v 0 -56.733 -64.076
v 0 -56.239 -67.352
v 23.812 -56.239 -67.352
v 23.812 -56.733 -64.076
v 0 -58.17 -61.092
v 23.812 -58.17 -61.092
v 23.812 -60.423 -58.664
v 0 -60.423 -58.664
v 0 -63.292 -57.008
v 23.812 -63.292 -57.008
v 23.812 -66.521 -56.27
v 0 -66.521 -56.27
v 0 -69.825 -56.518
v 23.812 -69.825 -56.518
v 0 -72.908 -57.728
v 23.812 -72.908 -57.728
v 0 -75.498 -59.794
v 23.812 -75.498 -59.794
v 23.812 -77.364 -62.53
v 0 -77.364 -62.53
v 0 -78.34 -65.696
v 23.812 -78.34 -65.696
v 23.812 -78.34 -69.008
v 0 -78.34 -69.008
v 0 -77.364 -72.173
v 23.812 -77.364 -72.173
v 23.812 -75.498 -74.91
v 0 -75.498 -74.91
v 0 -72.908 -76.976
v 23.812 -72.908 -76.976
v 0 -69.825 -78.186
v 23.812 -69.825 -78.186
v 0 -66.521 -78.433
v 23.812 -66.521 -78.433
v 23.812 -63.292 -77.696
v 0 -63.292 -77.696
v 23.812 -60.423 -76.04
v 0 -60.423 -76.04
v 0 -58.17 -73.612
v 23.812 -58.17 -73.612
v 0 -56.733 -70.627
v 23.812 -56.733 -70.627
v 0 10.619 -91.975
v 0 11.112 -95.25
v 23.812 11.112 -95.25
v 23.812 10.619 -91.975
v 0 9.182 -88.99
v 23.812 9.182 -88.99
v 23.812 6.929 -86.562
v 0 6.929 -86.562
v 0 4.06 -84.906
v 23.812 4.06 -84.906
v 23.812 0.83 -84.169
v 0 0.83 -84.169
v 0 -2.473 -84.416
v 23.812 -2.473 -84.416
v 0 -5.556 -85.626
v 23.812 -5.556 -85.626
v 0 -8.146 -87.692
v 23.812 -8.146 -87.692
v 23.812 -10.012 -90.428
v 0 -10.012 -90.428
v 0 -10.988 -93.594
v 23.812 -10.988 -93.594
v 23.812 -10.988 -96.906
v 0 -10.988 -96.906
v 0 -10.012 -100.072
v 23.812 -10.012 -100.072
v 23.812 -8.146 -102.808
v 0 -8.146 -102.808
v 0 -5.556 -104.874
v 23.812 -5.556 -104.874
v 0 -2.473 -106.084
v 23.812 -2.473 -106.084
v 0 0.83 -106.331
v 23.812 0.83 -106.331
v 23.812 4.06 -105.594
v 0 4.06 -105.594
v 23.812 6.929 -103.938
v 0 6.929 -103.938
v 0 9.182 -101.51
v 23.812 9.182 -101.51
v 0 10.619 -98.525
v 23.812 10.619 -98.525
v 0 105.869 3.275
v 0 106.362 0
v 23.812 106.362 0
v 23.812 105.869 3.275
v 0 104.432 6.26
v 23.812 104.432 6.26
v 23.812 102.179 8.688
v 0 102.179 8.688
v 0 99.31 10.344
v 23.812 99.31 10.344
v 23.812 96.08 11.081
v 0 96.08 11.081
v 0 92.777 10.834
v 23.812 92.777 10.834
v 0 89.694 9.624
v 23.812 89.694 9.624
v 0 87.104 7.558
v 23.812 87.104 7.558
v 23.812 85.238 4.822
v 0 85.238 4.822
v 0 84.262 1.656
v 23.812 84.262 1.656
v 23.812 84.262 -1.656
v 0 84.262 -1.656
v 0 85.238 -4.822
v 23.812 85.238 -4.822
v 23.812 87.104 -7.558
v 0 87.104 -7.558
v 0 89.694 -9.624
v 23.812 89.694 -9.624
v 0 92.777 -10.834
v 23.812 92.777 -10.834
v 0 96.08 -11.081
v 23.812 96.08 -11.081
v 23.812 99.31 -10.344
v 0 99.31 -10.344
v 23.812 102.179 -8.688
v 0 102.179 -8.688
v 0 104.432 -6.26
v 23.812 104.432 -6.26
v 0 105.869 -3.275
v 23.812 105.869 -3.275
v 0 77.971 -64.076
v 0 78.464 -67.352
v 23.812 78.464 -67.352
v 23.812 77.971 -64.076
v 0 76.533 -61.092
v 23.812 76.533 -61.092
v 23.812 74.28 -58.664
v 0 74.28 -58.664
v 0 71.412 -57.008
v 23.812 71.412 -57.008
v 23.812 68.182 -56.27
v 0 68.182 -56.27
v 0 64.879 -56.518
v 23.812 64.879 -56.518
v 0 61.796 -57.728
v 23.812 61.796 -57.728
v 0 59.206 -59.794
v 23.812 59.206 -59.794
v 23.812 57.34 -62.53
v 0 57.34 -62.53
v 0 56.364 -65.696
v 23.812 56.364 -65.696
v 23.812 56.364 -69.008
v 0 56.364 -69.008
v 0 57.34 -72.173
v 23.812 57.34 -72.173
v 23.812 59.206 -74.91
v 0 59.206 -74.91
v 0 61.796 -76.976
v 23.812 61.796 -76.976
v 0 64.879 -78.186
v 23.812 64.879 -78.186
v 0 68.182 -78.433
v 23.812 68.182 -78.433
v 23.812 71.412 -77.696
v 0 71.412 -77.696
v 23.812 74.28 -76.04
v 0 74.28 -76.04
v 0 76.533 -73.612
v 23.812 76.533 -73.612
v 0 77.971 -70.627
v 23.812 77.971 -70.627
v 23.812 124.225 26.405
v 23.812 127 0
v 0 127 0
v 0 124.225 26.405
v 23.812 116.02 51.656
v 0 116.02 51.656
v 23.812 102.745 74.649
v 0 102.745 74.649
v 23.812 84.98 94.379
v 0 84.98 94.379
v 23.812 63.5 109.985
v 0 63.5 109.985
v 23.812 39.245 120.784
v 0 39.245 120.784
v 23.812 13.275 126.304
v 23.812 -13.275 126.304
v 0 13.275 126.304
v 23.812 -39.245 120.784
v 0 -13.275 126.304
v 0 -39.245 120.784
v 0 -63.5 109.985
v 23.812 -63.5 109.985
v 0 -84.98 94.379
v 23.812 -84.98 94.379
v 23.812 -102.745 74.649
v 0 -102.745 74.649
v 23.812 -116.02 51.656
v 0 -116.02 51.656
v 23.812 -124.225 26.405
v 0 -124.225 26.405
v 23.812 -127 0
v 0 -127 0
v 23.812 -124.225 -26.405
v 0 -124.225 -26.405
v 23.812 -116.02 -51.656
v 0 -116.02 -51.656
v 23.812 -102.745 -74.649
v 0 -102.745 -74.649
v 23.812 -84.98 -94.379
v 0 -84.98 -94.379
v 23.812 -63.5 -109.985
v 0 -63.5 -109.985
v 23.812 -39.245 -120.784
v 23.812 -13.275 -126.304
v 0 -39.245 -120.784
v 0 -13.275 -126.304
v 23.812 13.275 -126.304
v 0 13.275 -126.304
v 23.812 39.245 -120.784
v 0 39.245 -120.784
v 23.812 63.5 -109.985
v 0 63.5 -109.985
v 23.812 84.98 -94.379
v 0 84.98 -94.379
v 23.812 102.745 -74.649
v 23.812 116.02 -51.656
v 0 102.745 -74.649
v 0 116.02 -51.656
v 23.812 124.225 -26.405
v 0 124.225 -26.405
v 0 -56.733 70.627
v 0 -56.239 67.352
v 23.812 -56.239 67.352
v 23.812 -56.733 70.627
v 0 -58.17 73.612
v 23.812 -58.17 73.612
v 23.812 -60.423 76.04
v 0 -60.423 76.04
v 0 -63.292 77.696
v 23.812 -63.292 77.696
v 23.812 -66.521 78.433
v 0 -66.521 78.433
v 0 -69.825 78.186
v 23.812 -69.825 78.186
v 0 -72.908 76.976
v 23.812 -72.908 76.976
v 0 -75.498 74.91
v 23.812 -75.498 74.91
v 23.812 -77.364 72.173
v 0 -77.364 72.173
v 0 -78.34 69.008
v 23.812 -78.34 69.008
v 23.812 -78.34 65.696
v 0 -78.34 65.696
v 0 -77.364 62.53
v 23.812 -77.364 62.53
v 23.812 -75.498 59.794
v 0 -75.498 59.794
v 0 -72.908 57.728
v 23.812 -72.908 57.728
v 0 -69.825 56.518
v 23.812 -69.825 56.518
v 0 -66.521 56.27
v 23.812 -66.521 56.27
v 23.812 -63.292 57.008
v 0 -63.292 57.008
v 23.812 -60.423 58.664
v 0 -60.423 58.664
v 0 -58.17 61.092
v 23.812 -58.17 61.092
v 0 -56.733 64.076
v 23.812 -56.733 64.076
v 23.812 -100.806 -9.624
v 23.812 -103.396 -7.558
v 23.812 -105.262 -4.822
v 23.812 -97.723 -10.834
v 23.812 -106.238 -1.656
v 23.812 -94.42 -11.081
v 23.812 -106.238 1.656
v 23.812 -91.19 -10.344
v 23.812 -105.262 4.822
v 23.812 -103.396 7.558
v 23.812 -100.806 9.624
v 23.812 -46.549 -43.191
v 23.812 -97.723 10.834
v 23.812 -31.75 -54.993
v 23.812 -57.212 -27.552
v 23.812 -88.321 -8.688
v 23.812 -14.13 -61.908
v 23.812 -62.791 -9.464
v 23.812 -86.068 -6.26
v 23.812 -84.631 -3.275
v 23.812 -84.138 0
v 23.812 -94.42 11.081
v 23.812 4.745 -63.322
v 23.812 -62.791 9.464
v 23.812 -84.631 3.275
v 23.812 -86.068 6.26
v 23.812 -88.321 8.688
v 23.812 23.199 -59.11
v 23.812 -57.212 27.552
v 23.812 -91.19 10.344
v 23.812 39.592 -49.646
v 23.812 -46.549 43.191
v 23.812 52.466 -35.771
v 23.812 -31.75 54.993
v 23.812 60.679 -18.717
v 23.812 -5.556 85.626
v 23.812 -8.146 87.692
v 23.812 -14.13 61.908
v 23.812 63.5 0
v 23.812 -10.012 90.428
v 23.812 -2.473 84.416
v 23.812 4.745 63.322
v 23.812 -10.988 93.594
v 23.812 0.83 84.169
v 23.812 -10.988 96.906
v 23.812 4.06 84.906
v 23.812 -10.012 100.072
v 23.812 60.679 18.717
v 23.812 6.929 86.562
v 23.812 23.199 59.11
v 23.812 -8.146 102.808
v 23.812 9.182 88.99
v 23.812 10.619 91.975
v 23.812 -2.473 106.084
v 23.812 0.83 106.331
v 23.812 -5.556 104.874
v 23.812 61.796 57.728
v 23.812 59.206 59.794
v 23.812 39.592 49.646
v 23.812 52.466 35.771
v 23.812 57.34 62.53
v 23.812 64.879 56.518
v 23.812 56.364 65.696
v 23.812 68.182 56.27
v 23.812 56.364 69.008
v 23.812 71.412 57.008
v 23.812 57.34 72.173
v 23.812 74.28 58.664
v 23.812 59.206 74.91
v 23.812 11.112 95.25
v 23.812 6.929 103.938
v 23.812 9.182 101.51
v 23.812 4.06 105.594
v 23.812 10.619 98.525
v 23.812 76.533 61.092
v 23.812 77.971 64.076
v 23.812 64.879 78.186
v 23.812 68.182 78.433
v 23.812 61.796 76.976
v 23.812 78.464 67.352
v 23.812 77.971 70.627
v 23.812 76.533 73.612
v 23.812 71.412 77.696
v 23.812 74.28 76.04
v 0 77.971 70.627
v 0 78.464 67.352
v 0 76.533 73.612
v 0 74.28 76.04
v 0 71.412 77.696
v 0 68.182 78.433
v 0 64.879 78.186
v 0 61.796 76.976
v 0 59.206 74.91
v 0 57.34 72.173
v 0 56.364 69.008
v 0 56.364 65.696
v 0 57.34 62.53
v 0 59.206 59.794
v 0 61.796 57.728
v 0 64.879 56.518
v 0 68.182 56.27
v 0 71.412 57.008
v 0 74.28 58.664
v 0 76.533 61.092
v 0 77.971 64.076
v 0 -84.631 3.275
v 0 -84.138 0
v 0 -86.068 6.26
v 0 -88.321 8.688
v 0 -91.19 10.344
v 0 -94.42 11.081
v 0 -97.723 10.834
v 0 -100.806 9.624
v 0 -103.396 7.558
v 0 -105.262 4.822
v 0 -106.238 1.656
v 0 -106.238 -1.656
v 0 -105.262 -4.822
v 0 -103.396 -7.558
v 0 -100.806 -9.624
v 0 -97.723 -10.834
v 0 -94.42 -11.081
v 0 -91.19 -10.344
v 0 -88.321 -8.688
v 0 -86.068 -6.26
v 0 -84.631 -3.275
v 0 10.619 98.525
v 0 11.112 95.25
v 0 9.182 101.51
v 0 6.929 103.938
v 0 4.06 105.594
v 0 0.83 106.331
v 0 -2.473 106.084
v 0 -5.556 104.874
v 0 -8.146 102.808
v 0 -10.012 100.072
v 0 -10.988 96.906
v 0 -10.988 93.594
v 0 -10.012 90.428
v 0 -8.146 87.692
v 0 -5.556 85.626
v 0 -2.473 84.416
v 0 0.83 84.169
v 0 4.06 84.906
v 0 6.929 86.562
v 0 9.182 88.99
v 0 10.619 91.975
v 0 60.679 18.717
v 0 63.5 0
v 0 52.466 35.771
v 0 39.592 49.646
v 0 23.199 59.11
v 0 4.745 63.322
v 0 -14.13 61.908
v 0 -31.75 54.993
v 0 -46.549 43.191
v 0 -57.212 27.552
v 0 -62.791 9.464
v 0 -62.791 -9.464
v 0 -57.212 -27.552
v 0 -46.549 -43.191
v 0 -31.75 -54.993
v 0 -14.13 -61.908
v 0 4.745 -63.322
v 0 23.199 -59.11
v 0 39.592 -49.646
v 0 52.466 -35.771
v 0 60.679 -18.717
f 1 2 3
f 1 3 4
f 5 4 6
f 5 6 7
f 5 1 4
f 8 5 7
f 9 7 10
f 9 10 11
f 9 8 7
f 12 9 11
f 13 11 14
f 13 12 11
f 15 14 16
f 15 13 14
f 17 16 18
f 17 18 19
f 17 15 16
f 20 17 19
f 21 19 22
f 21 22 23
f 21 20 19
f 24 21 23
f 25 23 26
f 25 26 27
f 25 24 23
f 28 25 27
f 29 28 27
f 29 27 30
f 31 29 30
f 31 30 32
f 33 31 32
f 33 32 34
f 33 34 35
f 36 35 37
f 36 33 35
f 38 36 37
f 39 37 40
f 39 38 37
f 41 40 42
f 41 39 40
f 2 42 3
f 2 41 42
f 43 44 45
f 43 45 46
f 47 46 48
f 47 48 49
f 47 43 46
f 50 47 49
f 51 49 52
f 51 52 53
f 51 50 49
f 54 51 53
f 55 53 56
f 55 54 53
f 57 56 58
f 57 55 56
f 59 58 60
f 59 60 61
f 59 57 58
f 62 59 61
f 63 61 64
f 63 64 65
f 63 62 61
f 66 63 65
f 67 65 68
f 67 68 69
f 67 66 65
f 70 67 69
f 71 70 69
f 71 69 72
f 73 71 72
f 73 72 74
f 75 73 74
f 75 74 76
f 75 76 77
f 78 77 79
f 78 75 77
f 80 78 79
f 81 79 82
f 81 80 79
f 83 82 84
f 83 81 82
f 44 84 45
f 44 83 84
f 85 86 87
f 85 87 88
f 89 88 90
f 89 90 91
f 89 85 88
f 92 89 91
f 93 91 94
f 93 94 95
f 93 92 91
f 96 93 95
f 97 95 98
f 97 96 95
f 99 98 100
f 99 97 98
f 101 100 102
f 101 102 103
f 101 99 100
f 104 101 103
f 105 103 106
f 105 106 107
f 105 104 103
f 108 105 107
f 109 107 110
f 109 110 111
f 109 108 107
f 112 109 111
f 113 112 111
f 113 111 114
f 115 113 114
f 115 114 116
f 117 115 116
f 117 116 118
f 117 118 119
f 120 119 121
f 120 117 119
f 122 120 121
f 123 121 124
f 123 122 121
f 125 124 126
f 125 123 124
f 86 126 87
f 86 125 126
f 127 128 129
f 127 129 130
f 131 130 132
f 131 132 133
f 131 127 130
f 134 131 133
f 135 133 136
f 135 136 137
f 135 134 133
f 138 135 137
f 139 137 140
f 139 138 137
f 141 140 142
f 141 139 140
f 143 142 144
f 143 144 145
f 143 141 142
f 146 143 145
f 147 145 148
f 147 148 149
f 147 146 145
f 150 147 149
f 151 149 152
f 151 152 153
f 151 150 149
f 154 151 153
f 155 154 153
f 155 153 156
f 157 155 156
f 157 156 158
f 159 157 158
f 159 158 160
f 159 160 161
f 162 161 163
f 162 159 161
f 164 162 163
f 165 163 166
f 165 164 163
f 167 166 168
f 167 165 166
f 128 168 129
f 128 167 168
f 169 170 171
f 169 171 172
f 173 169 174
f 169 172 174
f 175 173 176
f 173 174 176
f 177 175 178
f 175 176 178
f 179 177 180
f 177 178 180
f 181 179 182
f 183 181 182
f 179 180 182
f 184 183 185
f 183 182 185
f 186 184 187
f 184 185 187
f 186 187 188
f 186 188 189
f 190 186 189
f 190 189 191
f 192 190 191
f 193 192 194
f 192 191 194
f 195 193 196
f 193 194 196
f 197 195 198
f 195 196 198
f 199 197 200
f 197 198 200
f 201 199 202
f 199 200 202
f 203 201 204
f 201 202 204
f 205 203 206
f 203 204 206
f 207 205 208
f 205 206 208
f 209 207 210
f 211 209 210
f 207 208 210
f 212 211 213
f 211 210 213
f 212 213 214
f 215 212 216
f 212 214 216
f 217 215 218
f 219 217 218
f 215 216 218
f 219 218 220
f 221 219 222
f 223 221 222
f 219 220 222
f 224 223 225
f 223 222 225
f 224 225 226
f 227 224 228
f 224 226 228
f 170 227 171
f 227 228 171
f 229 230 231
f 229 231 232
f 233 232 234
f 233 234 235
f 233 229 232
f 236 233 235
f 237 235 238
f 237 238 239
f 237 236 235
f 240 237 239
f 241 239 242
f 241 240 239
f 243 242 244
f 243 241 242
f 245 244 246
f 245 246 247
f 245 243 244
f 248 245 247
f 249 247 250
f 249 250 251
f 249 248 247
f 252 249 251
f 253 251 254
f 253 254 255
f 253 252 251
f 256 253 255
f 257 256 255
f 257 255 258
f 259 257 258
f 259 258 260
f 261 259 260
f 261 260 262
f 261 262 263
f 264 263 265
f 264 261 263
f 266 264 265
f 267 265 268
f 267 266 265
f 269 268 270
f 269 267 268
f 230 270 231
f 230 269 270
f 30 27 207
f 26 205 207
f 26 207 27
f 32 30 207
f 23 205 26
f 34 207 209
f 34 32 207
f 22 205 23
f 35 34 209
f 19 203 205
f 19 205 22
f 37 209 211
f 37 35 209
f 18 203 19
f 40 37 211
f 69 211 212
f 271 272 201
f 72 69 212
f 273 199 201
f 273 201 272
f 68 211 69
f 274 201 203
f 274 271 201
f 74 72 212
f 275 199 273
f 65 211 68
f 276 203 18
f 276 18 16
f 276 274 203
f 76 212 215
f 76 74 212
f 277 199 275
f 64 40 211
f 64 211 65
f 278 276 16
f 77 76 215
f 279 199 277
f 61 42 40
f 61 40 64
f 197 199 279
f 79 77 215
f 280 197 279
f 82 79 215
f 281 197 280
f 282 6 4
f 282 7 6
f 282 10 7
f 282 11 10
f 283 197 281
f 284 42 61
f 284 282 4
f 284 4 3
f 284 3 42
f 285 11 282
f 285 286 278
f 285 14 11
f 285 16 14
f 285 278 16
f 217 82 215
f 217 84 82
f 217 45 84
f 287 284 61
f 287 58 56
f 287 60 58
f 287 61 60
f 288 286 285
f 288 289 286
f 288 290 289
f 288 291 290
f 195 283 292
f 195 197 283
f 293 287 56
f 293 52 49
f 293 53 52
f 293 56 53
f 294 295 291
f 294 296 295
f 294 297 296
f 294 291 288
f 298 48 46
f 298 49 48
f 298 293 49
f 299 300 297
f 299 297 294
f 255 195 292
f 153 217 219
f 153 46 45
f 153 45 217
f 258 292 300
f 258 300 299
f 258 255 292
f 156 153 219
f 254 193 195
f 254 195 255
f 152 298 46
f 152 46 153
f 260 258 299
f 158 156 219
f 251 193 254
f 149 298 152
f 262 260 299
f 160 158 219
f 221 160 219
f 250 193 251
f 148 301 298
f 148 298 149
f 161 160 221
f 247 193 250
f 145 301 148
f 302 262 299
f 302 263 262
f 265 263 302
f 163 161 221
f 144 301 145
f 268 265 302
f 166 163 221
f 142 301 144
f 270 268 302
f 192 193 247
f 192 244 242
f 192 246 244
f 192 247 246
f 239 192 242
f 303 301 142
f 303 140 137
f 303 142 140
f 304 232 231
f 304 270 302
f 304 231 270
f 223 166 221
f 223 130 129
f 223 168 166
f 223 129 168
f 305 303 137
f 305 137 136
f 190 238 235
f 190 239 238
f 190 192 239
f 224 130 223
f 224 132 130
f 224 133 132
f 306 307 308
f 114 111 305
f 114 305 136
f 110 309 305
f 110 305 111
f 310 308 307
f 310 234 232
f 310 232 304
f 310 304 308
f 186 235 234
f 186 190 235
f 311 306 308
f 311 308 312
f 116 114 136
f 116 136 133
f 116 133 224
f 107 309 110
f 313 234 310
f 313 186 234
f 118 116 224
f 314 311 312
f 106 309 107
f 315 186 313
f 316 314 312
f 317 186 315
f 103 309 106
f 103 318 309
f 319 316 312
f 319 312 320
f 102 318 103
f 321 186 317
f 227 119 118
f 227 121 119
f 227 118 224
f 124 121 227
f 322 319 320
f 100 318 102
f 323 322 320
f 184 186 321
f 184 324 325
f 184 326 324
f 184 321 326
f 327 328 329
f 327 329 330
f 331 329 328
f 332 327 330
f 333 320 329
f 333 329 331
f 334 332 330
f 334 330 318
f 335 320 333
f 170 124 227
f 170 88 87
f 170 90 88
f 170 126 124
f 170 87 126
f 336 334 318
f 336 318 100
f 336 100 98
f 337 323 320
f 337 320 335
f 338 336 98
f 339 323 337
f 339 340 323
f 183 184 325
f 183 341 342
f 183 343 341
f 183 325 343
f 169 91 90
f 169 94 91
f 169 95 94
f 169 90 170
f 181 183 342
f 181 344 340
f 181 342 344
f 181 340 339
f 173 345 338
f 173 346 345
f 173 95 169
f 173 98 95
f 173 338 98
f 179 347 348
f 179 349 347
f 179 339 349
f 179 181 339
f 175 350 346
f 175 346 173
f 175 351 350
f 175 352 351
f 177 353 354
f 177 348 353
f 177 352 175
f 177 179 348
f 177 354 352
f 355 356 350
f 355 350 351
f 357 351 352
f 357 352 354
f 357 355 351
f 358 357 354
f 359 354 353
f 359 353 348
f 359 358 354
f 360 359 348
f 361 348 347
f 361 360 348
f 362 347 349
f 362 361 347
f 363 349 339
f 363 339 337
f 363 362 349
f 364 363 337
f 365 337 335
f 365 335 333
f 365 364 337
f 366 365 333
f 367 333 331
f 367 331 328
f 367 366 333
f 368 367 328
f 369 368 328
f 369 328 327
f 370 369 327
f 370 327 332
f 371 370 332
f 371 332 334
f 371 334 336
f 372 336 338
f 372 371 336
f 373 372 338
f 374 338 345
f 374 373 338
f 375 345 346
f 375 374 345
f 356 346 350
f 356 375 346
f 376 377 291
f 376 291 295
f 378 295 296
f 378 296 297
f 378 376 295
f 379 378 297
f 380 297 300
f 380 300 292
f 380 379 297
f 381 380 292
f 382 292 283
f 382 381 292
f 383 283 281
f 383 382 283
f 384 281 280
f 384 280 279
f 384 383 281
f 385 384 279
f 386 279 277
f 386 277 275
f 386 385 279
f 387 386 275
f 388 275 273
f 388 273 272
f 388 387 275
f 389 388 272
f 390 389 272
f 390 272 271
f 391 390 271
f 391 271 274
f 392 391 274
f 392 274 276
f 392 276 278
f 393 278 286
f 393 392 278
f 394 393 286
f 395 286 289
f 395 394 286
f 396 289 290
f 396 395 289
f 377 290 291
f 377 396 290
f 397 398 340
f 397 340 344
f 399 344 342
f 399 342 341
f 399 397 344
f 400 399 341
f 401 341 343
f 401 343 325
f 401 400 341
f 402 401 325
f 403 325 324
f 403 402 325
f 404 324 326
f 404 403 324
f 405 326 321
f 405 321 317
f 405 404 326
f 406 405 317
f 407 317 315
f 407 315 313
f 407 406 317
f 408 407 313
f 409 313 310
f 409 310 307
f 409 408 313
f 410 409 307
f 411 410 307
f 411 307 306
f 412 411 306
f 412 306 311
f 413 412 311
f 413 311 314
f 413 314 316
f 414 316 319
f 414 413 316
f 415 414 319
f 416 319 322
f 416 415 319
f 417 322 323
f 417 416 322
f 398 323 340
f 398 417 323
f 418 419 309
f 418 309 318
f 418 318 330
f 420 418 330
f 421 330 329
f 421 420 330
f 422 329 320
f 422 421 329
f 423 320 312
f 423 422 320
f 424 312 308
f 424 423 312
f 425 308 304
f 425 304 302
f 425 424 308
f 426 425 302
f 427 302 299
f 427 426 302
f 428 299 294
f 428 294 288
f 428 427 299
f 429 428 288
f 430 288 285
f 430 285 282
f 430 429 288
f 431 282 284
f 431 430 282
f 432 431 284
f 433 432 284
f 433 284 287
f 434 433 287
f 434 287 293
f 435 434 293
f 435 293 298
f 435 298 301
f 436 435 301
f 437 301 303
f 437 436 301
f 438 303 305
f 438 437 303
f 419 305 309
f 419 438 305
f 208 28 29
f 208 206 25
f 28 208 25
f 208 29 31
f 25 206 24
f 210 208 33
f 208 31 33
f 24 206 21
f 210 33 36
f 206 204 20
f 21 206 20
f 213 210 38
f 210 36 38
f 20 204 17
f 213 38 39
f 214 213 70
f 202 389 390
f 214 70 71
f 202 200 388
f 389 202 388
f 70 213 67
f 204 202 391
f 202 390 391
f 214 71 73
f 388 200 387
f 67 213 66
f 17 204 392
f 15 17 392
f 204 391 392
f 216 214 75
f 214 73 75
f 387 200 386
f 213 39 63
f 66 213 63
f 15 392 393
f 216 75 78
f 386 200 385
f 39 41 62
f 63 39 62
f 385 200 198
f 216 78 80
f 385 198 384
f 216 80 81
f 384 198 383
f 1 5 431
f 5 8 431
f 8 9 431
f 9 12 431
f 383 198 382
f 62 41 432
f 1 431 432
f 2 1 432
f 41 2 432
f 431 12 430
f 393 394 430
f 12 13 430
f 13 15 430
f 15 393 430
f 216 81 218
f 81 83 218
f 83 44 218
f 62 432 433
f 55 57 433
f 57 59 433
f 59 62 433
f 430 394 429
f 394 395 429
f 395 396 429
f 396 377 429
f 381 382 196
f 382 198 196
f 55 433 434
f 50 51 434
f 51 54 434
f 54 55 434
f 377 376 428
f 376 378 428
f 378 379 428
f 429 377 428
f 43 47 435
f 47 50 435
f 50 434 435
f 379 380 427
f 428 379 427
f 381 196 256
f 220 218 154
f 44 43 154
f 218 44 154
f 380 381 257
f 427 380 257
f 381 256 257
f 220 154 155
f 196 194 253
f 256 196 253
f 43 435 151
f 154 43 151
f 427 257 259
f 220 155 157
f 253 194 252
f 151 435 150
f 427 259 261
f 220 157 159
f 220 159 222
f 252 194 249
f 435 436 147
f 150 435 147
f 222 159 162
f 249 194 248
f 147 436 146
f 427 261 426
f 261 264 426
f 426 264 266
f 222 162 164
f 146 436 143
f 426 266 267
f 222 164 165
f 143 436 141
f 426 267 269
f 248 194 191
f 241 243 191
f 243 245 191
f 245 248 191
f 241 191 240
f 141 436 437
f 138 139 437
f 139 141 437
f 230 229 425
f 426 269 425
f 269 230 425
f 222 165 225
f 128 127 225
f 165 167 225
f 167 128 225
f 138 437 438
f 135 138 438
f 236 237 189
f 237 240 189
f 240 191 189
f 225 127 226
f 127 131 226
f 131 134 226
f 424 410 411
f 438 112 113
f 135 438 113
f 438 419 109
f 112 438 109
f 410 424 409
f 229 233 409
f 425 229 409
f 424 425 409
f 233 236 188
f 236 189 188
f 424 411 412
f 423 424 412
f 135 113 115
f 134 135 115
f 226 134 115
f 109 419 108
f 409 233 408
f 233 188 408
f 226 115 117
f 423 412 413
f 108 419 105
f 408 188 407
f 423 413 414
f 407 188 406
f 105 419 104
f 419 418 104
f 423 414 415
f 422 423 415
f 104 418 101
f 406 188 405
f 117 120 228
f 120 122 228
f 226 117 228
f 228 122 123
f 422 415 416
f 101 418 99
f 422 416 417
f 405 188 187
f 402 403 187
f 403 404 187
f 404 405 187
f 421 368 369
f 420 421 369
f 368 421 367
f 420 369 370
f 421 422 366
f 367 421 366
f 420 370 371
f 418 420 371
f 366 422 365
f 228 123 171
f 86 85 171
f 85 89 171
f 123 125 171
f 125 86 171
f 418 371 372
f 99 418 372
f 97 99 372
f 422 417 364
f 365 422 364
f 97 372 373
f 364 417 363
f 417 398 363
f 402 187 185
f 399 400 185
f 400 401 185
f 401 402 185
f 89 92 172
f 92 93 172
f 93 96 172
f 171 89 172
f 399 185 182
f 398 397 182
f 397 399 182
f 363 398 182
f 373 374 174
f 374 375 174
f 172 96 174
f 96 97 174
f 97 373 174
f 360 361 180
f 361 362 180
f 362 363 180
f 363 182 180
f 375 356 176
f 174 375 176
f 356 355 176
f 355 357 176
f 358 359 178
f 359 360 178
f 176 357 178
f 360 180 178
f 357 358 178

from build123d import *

# Parameters (mm, degrees)
F0_R     = 127
F0_R_2   = 11.1125
F0_R_3   = 63.5
F1_DEPTH = 23.8125


with BuildPart() as f1:
    # F0 (on Right) → F1 (new body)
    with BuildSketch(Plane.YZ):
        Circle(F0_R)
        with Locations((-67.351921, -67.351921)):
            Circle(F0_R_2, mode=Mode.SUBTRACT)
        with Locations((0, -95.25)):
            Circle(F0_R_2, mode=Mode.SUBTRACT)
        with Locations((67.351921, -67.351921)):
            Circle(F0_R_2, mode=Mode.SUBTRACT)
        with Locations((-95.25, 0)):
            Circle(F0_R_2, mode=Mode.SUBTRACT)
        with Locations((-67.351921, 67.351921)):
            Circle(F0_R_2, mode=Mode.SUBTRACT)
        Circle(F0_R_3, mode=Mode.SUBTRACT)
        with Locations((95.25, 0)):
            Circle(F0_R_2, mode=Mode.SUBTRACT)
        with Locations((0, 95.25)):
            Circle(F0_R_2, mode=Mode.SUBTRACT)
        with Locations((67.351921, 67.351921)):
            Circle(F0_R_2, mode=Mode.SUBTRACT)
    extrude(amount=F1_DEPTH)


solid = f1.part
